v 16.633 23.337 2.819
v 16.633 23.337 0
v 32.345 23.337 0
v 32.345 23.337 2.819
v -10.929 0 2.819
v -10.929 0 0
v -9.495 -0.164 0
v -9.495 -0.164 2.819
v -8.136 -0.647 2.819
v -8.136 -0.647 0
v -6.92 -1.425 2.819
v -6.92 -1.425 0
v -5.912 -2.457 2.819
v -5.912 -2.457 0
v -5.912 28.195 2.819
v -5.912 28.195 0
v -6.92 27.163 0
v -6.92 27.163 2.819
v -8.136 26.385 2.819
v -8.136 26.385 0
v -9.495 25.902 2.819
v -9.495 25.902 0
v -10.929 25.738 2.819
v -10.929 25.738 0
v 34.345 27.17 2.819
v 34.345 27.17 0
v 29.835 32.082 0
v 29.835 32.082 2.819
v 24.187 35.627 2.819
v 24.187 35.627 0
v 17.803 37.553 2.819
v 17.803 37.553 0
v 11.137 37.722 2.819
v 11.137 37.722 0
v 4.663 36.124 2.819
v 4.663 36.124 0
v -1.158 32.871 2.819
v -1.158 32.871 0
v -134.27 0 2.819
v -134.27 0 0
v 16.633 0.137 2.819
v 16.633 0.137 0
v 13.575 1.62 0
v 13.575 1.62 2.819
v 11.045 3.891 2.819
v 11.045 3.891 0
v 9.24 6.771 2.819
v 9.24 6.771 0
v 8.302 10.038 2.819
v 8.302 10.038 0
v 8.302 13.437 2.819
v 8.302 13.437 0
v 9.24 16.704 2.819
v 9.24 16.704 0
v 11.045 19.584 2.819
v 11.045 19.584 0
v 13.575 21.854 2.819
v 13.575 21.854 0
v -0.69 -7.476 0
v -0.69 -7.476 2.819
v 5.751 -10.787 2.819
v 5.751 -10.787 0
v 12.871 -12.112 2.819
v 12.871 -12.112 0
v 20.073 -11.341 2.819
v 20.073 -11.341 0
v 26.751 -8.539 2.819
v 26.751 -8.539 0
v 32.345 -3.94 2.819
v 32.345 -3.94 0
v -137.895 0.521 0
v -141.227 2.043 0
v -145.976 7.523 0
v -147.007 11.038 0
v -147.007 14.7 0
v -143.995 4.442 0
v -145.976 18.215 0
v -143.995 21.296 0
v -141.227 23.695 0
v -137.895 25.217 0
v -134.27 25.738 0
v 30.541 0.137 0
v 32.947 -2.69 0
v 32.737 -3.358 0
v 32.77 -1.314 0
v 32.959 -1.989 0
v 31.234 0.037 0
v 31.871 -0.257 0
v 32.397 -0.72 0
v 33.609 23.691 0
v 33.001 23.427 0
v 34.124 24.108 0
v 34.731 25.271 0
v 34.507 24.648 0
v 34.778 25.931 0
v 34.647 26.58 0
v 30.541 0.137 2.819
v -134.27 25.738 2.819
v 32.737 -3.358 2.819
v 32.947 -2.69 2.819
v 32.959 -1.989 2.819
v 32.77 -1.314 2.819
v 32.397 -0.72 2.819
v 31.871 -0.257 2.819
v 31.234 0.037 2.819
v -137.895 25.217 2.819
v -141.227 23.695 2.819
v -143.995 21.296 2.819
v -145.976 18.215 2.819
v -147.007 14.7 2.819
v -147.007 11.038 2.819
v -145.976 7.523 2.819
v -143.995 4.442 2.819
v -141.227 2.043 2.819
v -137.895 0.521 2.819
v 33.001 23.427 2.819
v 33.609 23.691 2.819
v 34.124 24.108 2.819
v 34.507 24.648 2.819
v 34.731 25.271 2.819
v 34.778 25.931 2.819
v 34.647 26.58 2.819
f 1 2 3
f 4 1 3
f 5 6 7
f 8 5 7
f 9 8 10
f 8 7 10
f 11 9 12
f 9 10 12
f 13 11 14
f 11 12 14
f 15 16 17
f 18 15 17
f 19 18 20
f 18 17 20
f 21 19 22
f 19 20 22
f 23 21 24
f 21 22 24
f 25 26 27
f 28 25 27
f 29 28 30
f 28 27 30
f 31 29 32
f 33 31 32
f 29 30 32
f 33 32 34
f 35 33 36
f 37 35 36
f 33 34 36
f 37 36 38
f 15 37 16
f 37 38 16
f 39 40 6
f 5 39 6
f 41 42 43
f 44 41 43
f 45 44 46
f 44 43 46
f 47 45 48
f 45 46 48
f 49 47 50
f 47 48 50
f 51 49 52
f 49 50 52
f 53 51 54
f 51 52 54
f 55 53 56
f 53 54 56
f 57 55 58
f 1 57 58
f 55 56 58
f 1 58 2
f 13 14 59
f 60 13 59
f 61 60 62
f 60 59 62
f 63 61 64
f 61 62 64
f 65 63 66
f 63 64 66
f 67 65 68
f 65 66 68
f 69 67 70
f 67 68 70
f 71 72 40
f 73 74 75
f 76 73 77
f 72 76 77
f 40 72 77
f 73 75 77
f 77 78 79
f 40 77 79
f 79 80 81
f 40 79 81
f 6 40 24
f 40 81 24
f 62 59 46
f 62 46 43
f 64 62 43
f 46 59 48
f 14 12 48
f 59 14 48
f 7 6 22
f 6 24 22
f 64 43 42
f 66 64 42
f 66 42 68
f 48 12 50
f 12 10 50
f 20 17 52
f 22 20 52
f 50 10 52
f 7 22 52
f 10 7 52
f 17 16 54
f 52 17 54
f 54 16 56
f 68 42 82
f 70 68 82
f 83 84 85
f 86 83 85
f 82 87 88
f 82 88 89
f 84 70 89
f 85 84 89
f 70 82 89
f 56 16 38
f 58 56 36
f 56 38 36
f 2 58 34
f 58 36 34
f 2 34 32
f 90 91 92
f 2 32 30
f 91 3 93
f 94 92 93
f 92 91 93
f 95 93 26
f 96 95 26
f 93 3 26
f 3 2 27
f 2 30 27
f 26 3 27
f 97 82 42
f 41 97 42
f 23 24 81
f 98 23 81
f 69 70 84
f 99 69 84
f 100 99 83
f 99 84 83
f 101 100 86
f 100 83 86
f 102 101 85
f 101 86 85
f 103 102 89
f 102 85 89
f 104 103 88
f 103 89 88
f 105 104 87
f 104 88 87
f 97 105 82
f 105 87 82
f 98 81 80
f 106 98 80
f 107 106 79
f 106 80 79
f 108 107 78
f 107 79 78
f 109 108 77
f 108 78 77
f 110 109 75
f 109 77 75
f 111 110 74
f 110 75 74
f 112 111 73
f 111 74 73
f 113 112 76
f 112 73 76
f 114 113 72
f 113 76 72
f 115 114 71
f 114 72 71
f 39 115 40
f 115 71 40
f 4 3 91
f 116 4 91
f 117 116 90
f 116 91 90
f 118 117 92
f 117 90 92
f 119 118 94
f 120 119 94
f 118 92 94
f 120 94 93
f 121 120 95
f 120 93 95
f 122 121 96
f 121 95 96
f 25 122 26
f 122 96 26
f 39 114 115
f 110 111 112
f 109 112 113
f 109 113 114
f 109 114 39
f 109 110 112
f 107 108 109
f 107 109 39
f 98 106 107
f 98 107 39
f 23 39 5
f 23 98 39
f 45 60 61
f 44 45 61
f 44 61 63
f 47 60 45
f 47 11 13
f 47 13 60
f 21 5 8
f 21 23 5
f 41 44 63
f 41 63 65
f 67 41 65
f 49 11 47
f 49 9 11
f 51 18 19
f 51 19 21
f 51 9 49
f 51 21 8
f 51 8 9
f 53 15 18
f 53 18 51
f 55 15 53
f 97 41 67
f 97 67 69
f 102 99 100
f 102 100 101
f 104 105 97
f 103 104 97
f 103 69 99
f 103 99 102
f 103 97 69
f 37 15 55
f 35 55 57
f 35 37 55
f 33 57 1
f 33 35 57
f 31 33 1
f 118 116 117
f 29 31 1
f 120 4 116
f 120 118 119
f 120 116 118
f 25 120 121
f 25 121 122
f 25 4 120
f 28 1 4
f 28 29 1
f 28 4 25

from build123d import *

# Parameters (mm, degrees)
F1_DEPTH = 2.8194


with BuildPart() as f1:
    # F0 (on Top) → F1 (new body)
    with BuildSketch(Plane.XY):
        with BuildLine():
            ThreePointArc((-5.911858, 28.195099), (-8.135546, 26.385217), (-10.928661, 25.737936))
            Line((-10.928661, 25.737936), (-134.269512, 25.737936))
            ThreePointArc((-134.269512, 25.737936), (-147.13848, 12.868968), (-134.269512, 0))
            Line((-134.269512, 0), (-10.928661, 0))
            ThreePointArc((-10.928661, 0), (-8.135546, -0.647281), (-5.911858, -2.457163))
            ThreePointArc((-5.911858, -2.457163), (12.871345, -12.112285), (32.345354, -3.939582))
            ThreePointArc((32.345354, -3.939582), (32.769998, -1.313703), (30.54071, 0.137446))
            Line((30.54071, 0.137446), (16.633371, 0.137446))
            ThreePointArc((16.633371, 0.137446), (8.182531, 11.737446), (16.633371, 23.337446))
            Line((16.633371, 23.337446), (32.345354, 23.337446))
            ThreePointArc((32.345354, 23.337446), (34.506755, 24.647631), (34.344997, 27.169945))
            ThreePointArc((34.344997, 27.169945), (14.475764, 37.860866), (-5.911858, 28.195099))
        make_face()
    extrude(amount=F1_DEPTH)


solid = f1.part
